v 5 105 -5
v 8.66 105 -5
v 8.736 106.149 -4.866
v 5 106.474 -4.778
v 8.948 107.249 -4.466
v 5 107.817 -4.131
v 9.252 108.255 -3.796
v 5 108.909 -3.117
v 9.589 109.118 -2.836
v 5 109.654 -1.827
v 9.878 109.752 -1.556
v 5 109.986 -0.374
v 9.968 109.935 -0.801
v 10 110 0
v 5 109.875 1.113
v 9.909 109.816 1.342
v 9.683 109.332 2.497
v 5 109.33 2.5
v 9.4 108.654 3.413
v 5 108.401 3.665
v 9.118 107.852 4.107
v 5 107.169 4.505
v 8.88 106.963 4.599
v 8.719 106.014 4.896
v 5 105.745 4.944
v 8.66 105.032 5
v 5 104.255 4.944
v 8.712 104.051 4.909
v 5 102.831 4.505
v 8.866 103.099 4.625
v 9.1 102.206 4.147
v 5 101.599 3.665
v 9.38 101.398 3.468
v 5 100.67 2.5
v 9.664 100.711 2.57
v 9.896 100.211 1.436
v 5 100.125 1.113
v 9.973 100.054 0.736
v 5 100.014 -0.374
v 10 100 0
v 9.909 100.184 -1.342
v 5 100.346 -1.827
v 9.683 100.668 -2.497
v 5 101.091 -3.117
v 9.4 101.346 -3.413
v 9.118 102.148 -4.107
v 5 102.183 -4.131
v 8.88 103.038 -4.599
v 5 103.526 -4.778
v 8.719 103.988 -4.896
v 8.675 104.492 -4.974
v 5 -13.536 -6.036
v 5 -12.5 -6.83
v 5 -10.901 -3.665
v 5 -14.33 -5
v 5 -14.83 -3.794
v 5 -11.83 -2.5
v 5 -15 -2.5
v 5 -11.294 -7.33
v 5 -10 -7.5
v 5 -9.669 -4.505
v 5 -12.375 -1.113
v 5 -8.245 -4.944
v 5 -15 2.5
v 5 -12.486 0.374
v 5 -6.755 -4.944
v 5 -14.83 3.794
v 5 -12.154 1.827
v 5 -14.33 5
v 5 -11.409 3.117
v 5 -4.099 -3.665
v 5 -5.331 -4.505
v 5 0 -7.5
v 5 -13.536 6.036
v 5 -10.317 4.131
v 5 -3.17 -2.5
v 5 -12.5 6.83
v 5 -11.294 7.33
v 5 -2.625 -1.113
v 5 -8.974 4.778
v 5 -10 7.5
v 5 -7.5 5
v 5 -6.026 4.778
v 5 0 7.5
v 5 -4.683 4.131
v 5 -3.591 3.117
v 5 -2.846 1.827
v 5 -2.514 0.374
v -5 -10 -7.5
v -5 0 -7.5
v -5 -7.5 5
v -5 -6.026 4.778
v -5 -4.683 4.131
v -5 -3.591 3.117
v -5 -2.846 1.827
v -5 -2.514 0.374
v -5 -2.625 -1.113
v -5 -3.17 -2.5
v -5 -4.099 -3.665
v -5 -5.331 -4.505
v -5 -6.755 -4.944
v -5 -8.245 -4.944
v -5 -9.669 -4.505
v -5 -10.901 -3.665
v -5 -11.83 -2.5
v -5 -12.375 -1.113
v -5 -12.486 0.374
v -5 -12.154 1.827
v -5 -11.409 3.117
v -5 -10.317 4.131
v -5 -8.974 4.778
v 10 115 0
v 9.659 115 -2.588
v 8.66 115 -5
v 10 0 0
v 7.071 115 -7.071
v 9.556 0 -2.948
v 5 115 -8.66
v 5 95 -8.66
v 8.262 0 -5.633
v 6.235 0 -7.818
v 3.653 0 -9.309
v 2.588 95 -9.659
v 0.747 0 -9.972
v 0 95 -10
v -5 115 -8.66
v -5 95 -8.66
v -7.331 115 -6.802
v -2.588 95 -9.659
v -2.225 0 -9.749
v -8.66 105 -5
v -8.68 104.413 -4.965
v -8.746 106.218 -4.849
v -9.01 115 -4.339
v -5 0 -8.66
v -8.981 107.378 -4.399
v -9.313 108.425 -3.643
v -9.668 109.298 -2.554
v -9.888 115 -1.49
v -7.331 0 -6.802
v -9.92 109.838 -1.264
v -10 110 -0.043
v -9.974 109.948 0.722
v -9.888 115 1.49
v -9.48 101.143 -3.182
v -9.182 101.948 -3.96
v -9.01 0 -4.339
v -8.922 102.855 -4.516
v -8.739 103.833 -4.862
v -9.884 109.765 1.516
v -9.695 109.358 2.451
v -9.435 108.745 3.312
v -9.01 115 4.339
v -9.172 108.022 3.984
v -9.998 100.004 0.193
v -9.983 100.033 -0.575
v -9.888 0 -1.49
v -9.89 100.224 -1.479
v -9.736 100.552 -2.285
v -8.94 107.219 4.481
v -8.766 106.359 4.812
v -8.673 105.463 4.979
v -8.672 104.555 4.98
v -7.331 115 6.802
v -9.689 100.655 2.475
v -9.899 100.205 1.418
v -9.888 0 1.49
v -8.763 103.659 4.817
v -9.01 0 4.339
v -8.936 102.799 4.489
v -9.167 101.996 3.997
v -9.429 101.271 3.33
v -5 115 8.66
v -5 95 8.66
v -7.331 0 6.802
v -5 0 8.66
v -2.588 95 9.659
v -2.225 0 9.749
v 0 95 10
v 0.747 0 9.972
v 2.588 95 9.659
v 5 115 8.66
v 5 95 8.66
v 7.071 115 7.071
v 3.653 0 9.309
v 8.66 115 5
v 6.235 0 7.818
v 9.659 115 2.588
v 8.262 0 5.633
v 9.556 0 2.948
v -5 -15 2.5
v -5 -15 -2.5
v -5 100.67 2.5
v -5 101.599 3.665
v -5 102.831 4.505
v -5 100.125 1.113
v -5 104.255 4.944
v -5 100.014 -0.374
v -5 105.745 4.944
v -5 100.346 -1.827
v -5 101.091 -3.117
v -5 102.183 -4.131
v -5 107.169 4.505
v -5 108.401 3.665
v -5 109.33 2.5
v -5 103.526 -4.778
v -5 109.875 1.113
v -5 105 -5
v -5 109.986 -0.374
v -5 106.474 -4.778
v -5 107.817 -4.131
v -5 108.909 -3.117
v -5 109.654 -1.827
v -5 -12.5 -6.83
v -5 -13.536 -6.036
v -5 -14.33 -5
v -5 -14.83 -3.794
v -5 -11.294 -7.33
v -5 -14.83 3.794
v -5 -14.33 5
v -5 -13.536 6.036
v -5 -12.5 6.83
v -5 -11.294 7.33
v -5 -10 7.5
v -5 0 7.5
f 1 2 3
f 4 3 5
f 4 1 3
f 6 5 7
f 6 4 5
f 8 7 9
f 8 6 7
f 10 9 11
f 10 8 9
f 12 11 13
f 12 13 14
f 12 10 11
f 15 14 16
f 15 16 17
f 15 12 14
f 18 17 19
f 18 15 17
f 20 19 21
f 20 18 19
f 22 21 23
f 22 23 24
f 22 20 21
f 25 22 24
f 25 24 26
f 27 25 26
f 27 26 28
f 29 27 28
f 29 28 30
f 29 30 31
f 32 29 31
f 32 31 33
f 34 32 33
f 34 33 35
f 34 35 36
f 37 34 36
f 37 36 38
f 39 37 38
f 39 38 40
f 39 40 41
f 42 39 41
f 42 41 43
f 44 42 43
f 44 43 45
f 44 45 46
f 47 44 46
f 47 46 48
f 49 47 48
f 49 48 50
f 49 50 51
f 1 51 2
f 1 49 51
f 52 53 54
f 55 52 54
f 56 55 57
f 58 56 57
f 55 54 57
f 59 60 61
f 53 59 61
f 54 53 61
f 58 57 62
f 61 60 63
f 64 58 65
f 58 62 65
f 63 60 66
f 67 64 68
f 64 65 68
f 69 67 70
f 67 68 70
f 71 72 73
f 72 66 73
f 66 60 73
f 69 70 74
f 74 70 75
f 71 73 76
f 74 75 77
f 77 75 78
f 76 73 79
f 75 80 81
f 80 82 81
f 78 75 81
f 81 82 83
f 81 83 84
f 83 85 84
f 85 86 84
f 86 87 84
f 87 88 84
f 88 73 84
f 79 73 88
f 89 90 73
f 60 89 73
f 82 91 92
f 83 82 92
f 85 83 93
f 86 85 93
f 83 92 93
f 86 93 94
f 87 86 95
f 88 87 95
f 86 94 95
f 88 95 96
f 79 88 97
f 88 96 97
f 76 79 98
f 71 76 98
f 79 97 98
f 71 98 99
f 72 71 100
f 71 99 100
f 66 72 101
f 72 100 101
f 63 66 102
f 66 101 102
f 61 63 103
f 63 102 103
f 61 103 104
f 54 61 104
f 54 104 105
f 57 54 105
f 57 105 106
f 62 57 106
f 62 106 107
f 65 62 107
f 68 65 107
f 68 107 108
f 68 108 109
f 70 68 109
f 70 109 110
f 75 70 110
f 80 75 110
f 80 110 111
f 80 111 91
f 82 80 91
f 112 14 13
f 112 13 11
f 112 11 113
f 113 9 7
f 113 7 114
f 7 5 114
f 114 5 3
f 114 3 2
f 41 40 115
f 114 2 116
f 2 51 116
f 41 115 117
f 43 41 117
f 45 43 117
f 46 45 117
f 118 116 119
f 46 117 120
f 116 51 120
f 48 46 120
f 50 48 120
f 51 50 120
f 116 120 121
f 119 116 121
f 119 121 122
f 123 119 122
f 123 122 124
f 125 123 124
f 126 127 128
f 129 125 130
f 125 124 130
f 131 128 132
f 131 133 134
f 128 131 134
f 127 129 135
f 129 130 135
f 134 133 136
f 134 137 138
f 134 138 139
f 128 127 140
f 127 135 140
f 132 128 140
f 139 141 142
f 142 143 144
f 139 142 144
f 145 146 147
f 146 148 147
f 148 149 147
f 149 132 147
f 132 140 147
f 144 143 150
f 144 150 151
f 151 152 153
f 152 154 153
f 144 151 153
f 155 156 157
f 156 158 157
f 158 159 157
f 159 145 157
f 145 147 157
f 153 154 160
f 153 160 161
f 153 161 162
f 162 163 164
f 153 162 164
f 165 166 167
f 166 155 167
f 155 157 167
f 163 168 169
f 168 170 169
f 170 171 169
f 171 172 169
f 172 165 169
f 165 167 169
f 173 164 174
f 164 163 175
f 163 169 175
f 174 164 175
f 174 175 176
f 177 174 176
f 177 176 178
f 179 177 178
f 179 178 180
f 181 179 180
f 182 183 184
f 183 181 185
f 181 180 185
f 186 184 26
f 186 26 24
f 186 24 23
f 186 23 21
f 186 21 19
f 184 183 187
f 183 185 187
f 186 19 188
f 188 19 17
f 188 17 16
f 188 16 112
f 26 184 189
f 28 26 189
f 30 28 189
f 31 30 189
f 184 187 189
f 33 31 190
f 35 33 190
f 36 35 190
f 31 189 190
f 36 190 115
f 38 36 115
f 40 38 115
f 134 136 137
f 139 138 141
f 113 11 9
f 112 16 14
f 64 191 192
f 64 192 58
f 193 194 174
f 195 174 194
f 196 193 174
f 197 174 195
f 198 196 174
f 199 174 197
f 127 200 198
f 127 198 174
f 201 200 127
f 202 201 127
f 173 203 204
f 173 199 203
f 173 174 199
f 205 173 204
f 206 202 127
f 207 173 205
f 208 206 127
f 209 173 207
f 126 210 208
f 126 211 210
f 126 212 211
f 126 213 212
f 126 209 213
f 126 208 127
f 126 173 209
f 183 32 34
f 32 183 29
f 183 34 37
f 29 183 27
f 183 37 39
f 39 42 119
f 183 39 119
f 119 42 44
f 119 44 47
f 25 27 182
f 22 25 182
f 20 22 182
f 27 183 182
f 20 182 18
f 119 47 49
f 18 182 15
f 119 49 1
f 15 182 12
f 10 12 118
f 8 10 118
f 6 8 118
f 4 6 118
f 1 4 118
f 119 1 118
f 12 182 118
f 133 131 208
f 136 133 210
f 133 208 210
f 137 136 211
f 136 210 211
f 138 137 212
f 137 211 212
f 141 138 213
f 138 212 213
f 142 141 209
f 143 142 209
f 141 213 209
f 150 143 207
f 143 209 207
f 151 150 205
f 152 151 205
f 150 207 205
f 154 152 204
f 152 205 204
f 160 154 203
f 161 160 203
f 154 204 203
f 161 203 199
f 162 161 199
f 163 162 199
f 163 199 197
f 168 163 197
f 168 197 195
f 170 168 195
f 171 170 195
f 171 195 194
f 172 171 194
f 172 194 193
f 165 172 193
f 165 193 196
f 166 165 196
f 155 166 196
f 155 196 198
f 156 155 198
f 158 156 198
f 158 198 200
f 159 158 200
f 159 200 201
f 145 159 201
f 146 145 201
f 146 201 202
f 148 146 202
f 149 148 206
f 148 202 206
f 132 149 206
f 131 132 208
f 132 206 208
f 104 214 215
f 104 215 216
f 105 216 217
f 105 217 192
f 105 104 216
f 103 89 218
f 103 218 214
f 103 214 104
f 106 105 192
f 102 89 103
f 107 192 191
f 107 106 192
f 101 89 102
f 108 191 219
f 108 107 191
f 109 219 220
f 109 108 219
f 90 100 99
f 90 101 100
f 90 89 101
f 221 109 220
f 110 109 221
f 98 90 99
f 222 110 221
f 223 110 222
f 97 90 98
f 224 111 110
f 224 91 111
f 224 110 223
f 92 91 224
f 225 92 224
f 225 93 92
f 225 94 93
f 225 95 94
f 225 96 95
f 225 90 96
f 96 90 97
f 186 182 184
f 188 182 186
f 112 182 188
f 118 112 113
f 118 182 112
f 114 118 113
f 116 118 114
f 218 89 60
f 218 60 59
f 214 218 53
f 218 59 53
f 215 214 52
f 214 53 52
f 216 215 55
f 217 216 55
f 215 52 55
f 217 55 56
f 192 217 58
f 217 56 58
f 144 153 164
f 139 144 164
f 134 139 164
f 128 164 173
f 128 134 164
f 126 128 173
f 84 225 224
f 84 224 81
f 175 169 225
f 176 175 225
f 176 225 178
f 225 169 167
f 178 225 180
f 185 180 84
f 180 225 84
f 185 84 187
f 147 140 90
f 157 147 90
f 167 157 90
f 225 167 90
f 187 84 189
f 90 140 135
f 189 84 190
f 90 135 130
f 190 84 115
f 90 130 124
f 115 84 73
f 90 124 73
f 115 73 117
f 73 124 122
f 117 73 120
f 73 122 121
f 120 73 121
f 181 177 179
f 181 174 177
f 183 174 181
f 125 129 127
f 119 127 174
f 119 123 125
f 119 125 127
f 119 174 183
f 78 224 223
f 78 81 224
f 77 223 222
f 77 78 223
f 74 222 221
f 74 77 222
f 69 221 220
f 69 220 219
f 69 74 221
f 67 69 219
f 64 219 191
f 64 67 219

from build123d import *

# Parameters (mm, degrees)
SKETCH1_R               = 10
BOSS_EXTRUDE1_DEPTH     = 95
SKETCH4_W               = 10
SKETCH4_H               = 15
BOSS_EXTRUDE3_DEPTH     = 15
SKETCH5_R               = 5
CUT_EXTRUDE2_DEPTH      = 15
FILLET1_R               = 5
SKETCH9_R               = 10
BOSS_EXTRUDE4_DEPTH     = 20
SKETCH10_W              = 10
SKETCH10_H              = 36.273756528
CUT_EXTRUDE4_DEPTH      = 20
SKETCH12_R              = 5
CUT_EXTRUDE5_DEPTH      = 11
CUT_EXTRUDE5_DEPTH_BACK = 11


with BuildPart() as part:
    # Sketch1 → Boss-Extrude1 (new body)
    with BuildSketch(Plane(origin=(0, 0, 0), x_dir=(1, 0, 0), z_dir=(0, 1, 0))):
        Circle(SKETCH1_R)
    extrude(amount=BOSS_EXTRUDE1_DEPTH)

    # Sketch4 → Boss-Extrude3 (add)
    with BuildSketch(Plane.XZ):
        Rectangle(SKETCH4_W, SKETCH4_H)
    extrude(amount=BOSS_EXTRUDE3_DEPTH)

    # Sketch5 → Cut-Extrude2 (cut)
    with BuildSketch(Plane.ZY.offset(5)):
        with Locations((0, -7.5)):
            Circle(SKETCH5_R)
    extrude(amount=-CUT_EXTRUDE2_DEPTH, mode=Mode.SUBTRACT)

    # Fillet1
    fillet1_edges = [part.edges().sort_by_distance(p)[0] for p in [
        (0, -15, -7.5),
        (0, -15, 7.5),
    ]]
    fillet(fillet1_edges, radius=FILLET1_R)

    # Sketch9 → Boss-Extrude4 (add)
    with BuildSketch(Plane(origin=(0, 95, 0), x_dir=(1, 0, 0), z_dir=(0, 1, 0))):
        Circle(SKETCH9_R)
    extrude(amount=BOSS_EXTRUDE4_DEPTH)

    # Sketch10 → Cut-Extrude4 (cut)
    with BuildSketch(Plane(origin=(0, 115, 0), x_dir=(1, 0, 0), z_dir=(0, 1, 0))):
        Rectangle(SKETCH10_W, SKETCH10_H)
    extrude(amount=-CUT_EXTRUDE4_DEPTH, mode=Mode.SUBTRACT)

    # Sketch12 → Cut-Extrude5 (cut, two sides)
    with BuildSketch(Plane(origin=(0, 0, 0), x_dir=(0, 0, -1), z_dir=(1, 0, 0))) as cut_extrude5_sk:
        with Locations((0, 105)):
            Circle(SKETCH12_R)
    extrude(amount=CUT_EXTRUDE5_DEPTH, mode=Mode.SUBTRACT)
    extrude(cut_extrude5_sk.sketch, amount=-CUT_EXTRUDE5_DEPTH_BACK, mode=Mode.SUBTRACT)


solid = part.part
